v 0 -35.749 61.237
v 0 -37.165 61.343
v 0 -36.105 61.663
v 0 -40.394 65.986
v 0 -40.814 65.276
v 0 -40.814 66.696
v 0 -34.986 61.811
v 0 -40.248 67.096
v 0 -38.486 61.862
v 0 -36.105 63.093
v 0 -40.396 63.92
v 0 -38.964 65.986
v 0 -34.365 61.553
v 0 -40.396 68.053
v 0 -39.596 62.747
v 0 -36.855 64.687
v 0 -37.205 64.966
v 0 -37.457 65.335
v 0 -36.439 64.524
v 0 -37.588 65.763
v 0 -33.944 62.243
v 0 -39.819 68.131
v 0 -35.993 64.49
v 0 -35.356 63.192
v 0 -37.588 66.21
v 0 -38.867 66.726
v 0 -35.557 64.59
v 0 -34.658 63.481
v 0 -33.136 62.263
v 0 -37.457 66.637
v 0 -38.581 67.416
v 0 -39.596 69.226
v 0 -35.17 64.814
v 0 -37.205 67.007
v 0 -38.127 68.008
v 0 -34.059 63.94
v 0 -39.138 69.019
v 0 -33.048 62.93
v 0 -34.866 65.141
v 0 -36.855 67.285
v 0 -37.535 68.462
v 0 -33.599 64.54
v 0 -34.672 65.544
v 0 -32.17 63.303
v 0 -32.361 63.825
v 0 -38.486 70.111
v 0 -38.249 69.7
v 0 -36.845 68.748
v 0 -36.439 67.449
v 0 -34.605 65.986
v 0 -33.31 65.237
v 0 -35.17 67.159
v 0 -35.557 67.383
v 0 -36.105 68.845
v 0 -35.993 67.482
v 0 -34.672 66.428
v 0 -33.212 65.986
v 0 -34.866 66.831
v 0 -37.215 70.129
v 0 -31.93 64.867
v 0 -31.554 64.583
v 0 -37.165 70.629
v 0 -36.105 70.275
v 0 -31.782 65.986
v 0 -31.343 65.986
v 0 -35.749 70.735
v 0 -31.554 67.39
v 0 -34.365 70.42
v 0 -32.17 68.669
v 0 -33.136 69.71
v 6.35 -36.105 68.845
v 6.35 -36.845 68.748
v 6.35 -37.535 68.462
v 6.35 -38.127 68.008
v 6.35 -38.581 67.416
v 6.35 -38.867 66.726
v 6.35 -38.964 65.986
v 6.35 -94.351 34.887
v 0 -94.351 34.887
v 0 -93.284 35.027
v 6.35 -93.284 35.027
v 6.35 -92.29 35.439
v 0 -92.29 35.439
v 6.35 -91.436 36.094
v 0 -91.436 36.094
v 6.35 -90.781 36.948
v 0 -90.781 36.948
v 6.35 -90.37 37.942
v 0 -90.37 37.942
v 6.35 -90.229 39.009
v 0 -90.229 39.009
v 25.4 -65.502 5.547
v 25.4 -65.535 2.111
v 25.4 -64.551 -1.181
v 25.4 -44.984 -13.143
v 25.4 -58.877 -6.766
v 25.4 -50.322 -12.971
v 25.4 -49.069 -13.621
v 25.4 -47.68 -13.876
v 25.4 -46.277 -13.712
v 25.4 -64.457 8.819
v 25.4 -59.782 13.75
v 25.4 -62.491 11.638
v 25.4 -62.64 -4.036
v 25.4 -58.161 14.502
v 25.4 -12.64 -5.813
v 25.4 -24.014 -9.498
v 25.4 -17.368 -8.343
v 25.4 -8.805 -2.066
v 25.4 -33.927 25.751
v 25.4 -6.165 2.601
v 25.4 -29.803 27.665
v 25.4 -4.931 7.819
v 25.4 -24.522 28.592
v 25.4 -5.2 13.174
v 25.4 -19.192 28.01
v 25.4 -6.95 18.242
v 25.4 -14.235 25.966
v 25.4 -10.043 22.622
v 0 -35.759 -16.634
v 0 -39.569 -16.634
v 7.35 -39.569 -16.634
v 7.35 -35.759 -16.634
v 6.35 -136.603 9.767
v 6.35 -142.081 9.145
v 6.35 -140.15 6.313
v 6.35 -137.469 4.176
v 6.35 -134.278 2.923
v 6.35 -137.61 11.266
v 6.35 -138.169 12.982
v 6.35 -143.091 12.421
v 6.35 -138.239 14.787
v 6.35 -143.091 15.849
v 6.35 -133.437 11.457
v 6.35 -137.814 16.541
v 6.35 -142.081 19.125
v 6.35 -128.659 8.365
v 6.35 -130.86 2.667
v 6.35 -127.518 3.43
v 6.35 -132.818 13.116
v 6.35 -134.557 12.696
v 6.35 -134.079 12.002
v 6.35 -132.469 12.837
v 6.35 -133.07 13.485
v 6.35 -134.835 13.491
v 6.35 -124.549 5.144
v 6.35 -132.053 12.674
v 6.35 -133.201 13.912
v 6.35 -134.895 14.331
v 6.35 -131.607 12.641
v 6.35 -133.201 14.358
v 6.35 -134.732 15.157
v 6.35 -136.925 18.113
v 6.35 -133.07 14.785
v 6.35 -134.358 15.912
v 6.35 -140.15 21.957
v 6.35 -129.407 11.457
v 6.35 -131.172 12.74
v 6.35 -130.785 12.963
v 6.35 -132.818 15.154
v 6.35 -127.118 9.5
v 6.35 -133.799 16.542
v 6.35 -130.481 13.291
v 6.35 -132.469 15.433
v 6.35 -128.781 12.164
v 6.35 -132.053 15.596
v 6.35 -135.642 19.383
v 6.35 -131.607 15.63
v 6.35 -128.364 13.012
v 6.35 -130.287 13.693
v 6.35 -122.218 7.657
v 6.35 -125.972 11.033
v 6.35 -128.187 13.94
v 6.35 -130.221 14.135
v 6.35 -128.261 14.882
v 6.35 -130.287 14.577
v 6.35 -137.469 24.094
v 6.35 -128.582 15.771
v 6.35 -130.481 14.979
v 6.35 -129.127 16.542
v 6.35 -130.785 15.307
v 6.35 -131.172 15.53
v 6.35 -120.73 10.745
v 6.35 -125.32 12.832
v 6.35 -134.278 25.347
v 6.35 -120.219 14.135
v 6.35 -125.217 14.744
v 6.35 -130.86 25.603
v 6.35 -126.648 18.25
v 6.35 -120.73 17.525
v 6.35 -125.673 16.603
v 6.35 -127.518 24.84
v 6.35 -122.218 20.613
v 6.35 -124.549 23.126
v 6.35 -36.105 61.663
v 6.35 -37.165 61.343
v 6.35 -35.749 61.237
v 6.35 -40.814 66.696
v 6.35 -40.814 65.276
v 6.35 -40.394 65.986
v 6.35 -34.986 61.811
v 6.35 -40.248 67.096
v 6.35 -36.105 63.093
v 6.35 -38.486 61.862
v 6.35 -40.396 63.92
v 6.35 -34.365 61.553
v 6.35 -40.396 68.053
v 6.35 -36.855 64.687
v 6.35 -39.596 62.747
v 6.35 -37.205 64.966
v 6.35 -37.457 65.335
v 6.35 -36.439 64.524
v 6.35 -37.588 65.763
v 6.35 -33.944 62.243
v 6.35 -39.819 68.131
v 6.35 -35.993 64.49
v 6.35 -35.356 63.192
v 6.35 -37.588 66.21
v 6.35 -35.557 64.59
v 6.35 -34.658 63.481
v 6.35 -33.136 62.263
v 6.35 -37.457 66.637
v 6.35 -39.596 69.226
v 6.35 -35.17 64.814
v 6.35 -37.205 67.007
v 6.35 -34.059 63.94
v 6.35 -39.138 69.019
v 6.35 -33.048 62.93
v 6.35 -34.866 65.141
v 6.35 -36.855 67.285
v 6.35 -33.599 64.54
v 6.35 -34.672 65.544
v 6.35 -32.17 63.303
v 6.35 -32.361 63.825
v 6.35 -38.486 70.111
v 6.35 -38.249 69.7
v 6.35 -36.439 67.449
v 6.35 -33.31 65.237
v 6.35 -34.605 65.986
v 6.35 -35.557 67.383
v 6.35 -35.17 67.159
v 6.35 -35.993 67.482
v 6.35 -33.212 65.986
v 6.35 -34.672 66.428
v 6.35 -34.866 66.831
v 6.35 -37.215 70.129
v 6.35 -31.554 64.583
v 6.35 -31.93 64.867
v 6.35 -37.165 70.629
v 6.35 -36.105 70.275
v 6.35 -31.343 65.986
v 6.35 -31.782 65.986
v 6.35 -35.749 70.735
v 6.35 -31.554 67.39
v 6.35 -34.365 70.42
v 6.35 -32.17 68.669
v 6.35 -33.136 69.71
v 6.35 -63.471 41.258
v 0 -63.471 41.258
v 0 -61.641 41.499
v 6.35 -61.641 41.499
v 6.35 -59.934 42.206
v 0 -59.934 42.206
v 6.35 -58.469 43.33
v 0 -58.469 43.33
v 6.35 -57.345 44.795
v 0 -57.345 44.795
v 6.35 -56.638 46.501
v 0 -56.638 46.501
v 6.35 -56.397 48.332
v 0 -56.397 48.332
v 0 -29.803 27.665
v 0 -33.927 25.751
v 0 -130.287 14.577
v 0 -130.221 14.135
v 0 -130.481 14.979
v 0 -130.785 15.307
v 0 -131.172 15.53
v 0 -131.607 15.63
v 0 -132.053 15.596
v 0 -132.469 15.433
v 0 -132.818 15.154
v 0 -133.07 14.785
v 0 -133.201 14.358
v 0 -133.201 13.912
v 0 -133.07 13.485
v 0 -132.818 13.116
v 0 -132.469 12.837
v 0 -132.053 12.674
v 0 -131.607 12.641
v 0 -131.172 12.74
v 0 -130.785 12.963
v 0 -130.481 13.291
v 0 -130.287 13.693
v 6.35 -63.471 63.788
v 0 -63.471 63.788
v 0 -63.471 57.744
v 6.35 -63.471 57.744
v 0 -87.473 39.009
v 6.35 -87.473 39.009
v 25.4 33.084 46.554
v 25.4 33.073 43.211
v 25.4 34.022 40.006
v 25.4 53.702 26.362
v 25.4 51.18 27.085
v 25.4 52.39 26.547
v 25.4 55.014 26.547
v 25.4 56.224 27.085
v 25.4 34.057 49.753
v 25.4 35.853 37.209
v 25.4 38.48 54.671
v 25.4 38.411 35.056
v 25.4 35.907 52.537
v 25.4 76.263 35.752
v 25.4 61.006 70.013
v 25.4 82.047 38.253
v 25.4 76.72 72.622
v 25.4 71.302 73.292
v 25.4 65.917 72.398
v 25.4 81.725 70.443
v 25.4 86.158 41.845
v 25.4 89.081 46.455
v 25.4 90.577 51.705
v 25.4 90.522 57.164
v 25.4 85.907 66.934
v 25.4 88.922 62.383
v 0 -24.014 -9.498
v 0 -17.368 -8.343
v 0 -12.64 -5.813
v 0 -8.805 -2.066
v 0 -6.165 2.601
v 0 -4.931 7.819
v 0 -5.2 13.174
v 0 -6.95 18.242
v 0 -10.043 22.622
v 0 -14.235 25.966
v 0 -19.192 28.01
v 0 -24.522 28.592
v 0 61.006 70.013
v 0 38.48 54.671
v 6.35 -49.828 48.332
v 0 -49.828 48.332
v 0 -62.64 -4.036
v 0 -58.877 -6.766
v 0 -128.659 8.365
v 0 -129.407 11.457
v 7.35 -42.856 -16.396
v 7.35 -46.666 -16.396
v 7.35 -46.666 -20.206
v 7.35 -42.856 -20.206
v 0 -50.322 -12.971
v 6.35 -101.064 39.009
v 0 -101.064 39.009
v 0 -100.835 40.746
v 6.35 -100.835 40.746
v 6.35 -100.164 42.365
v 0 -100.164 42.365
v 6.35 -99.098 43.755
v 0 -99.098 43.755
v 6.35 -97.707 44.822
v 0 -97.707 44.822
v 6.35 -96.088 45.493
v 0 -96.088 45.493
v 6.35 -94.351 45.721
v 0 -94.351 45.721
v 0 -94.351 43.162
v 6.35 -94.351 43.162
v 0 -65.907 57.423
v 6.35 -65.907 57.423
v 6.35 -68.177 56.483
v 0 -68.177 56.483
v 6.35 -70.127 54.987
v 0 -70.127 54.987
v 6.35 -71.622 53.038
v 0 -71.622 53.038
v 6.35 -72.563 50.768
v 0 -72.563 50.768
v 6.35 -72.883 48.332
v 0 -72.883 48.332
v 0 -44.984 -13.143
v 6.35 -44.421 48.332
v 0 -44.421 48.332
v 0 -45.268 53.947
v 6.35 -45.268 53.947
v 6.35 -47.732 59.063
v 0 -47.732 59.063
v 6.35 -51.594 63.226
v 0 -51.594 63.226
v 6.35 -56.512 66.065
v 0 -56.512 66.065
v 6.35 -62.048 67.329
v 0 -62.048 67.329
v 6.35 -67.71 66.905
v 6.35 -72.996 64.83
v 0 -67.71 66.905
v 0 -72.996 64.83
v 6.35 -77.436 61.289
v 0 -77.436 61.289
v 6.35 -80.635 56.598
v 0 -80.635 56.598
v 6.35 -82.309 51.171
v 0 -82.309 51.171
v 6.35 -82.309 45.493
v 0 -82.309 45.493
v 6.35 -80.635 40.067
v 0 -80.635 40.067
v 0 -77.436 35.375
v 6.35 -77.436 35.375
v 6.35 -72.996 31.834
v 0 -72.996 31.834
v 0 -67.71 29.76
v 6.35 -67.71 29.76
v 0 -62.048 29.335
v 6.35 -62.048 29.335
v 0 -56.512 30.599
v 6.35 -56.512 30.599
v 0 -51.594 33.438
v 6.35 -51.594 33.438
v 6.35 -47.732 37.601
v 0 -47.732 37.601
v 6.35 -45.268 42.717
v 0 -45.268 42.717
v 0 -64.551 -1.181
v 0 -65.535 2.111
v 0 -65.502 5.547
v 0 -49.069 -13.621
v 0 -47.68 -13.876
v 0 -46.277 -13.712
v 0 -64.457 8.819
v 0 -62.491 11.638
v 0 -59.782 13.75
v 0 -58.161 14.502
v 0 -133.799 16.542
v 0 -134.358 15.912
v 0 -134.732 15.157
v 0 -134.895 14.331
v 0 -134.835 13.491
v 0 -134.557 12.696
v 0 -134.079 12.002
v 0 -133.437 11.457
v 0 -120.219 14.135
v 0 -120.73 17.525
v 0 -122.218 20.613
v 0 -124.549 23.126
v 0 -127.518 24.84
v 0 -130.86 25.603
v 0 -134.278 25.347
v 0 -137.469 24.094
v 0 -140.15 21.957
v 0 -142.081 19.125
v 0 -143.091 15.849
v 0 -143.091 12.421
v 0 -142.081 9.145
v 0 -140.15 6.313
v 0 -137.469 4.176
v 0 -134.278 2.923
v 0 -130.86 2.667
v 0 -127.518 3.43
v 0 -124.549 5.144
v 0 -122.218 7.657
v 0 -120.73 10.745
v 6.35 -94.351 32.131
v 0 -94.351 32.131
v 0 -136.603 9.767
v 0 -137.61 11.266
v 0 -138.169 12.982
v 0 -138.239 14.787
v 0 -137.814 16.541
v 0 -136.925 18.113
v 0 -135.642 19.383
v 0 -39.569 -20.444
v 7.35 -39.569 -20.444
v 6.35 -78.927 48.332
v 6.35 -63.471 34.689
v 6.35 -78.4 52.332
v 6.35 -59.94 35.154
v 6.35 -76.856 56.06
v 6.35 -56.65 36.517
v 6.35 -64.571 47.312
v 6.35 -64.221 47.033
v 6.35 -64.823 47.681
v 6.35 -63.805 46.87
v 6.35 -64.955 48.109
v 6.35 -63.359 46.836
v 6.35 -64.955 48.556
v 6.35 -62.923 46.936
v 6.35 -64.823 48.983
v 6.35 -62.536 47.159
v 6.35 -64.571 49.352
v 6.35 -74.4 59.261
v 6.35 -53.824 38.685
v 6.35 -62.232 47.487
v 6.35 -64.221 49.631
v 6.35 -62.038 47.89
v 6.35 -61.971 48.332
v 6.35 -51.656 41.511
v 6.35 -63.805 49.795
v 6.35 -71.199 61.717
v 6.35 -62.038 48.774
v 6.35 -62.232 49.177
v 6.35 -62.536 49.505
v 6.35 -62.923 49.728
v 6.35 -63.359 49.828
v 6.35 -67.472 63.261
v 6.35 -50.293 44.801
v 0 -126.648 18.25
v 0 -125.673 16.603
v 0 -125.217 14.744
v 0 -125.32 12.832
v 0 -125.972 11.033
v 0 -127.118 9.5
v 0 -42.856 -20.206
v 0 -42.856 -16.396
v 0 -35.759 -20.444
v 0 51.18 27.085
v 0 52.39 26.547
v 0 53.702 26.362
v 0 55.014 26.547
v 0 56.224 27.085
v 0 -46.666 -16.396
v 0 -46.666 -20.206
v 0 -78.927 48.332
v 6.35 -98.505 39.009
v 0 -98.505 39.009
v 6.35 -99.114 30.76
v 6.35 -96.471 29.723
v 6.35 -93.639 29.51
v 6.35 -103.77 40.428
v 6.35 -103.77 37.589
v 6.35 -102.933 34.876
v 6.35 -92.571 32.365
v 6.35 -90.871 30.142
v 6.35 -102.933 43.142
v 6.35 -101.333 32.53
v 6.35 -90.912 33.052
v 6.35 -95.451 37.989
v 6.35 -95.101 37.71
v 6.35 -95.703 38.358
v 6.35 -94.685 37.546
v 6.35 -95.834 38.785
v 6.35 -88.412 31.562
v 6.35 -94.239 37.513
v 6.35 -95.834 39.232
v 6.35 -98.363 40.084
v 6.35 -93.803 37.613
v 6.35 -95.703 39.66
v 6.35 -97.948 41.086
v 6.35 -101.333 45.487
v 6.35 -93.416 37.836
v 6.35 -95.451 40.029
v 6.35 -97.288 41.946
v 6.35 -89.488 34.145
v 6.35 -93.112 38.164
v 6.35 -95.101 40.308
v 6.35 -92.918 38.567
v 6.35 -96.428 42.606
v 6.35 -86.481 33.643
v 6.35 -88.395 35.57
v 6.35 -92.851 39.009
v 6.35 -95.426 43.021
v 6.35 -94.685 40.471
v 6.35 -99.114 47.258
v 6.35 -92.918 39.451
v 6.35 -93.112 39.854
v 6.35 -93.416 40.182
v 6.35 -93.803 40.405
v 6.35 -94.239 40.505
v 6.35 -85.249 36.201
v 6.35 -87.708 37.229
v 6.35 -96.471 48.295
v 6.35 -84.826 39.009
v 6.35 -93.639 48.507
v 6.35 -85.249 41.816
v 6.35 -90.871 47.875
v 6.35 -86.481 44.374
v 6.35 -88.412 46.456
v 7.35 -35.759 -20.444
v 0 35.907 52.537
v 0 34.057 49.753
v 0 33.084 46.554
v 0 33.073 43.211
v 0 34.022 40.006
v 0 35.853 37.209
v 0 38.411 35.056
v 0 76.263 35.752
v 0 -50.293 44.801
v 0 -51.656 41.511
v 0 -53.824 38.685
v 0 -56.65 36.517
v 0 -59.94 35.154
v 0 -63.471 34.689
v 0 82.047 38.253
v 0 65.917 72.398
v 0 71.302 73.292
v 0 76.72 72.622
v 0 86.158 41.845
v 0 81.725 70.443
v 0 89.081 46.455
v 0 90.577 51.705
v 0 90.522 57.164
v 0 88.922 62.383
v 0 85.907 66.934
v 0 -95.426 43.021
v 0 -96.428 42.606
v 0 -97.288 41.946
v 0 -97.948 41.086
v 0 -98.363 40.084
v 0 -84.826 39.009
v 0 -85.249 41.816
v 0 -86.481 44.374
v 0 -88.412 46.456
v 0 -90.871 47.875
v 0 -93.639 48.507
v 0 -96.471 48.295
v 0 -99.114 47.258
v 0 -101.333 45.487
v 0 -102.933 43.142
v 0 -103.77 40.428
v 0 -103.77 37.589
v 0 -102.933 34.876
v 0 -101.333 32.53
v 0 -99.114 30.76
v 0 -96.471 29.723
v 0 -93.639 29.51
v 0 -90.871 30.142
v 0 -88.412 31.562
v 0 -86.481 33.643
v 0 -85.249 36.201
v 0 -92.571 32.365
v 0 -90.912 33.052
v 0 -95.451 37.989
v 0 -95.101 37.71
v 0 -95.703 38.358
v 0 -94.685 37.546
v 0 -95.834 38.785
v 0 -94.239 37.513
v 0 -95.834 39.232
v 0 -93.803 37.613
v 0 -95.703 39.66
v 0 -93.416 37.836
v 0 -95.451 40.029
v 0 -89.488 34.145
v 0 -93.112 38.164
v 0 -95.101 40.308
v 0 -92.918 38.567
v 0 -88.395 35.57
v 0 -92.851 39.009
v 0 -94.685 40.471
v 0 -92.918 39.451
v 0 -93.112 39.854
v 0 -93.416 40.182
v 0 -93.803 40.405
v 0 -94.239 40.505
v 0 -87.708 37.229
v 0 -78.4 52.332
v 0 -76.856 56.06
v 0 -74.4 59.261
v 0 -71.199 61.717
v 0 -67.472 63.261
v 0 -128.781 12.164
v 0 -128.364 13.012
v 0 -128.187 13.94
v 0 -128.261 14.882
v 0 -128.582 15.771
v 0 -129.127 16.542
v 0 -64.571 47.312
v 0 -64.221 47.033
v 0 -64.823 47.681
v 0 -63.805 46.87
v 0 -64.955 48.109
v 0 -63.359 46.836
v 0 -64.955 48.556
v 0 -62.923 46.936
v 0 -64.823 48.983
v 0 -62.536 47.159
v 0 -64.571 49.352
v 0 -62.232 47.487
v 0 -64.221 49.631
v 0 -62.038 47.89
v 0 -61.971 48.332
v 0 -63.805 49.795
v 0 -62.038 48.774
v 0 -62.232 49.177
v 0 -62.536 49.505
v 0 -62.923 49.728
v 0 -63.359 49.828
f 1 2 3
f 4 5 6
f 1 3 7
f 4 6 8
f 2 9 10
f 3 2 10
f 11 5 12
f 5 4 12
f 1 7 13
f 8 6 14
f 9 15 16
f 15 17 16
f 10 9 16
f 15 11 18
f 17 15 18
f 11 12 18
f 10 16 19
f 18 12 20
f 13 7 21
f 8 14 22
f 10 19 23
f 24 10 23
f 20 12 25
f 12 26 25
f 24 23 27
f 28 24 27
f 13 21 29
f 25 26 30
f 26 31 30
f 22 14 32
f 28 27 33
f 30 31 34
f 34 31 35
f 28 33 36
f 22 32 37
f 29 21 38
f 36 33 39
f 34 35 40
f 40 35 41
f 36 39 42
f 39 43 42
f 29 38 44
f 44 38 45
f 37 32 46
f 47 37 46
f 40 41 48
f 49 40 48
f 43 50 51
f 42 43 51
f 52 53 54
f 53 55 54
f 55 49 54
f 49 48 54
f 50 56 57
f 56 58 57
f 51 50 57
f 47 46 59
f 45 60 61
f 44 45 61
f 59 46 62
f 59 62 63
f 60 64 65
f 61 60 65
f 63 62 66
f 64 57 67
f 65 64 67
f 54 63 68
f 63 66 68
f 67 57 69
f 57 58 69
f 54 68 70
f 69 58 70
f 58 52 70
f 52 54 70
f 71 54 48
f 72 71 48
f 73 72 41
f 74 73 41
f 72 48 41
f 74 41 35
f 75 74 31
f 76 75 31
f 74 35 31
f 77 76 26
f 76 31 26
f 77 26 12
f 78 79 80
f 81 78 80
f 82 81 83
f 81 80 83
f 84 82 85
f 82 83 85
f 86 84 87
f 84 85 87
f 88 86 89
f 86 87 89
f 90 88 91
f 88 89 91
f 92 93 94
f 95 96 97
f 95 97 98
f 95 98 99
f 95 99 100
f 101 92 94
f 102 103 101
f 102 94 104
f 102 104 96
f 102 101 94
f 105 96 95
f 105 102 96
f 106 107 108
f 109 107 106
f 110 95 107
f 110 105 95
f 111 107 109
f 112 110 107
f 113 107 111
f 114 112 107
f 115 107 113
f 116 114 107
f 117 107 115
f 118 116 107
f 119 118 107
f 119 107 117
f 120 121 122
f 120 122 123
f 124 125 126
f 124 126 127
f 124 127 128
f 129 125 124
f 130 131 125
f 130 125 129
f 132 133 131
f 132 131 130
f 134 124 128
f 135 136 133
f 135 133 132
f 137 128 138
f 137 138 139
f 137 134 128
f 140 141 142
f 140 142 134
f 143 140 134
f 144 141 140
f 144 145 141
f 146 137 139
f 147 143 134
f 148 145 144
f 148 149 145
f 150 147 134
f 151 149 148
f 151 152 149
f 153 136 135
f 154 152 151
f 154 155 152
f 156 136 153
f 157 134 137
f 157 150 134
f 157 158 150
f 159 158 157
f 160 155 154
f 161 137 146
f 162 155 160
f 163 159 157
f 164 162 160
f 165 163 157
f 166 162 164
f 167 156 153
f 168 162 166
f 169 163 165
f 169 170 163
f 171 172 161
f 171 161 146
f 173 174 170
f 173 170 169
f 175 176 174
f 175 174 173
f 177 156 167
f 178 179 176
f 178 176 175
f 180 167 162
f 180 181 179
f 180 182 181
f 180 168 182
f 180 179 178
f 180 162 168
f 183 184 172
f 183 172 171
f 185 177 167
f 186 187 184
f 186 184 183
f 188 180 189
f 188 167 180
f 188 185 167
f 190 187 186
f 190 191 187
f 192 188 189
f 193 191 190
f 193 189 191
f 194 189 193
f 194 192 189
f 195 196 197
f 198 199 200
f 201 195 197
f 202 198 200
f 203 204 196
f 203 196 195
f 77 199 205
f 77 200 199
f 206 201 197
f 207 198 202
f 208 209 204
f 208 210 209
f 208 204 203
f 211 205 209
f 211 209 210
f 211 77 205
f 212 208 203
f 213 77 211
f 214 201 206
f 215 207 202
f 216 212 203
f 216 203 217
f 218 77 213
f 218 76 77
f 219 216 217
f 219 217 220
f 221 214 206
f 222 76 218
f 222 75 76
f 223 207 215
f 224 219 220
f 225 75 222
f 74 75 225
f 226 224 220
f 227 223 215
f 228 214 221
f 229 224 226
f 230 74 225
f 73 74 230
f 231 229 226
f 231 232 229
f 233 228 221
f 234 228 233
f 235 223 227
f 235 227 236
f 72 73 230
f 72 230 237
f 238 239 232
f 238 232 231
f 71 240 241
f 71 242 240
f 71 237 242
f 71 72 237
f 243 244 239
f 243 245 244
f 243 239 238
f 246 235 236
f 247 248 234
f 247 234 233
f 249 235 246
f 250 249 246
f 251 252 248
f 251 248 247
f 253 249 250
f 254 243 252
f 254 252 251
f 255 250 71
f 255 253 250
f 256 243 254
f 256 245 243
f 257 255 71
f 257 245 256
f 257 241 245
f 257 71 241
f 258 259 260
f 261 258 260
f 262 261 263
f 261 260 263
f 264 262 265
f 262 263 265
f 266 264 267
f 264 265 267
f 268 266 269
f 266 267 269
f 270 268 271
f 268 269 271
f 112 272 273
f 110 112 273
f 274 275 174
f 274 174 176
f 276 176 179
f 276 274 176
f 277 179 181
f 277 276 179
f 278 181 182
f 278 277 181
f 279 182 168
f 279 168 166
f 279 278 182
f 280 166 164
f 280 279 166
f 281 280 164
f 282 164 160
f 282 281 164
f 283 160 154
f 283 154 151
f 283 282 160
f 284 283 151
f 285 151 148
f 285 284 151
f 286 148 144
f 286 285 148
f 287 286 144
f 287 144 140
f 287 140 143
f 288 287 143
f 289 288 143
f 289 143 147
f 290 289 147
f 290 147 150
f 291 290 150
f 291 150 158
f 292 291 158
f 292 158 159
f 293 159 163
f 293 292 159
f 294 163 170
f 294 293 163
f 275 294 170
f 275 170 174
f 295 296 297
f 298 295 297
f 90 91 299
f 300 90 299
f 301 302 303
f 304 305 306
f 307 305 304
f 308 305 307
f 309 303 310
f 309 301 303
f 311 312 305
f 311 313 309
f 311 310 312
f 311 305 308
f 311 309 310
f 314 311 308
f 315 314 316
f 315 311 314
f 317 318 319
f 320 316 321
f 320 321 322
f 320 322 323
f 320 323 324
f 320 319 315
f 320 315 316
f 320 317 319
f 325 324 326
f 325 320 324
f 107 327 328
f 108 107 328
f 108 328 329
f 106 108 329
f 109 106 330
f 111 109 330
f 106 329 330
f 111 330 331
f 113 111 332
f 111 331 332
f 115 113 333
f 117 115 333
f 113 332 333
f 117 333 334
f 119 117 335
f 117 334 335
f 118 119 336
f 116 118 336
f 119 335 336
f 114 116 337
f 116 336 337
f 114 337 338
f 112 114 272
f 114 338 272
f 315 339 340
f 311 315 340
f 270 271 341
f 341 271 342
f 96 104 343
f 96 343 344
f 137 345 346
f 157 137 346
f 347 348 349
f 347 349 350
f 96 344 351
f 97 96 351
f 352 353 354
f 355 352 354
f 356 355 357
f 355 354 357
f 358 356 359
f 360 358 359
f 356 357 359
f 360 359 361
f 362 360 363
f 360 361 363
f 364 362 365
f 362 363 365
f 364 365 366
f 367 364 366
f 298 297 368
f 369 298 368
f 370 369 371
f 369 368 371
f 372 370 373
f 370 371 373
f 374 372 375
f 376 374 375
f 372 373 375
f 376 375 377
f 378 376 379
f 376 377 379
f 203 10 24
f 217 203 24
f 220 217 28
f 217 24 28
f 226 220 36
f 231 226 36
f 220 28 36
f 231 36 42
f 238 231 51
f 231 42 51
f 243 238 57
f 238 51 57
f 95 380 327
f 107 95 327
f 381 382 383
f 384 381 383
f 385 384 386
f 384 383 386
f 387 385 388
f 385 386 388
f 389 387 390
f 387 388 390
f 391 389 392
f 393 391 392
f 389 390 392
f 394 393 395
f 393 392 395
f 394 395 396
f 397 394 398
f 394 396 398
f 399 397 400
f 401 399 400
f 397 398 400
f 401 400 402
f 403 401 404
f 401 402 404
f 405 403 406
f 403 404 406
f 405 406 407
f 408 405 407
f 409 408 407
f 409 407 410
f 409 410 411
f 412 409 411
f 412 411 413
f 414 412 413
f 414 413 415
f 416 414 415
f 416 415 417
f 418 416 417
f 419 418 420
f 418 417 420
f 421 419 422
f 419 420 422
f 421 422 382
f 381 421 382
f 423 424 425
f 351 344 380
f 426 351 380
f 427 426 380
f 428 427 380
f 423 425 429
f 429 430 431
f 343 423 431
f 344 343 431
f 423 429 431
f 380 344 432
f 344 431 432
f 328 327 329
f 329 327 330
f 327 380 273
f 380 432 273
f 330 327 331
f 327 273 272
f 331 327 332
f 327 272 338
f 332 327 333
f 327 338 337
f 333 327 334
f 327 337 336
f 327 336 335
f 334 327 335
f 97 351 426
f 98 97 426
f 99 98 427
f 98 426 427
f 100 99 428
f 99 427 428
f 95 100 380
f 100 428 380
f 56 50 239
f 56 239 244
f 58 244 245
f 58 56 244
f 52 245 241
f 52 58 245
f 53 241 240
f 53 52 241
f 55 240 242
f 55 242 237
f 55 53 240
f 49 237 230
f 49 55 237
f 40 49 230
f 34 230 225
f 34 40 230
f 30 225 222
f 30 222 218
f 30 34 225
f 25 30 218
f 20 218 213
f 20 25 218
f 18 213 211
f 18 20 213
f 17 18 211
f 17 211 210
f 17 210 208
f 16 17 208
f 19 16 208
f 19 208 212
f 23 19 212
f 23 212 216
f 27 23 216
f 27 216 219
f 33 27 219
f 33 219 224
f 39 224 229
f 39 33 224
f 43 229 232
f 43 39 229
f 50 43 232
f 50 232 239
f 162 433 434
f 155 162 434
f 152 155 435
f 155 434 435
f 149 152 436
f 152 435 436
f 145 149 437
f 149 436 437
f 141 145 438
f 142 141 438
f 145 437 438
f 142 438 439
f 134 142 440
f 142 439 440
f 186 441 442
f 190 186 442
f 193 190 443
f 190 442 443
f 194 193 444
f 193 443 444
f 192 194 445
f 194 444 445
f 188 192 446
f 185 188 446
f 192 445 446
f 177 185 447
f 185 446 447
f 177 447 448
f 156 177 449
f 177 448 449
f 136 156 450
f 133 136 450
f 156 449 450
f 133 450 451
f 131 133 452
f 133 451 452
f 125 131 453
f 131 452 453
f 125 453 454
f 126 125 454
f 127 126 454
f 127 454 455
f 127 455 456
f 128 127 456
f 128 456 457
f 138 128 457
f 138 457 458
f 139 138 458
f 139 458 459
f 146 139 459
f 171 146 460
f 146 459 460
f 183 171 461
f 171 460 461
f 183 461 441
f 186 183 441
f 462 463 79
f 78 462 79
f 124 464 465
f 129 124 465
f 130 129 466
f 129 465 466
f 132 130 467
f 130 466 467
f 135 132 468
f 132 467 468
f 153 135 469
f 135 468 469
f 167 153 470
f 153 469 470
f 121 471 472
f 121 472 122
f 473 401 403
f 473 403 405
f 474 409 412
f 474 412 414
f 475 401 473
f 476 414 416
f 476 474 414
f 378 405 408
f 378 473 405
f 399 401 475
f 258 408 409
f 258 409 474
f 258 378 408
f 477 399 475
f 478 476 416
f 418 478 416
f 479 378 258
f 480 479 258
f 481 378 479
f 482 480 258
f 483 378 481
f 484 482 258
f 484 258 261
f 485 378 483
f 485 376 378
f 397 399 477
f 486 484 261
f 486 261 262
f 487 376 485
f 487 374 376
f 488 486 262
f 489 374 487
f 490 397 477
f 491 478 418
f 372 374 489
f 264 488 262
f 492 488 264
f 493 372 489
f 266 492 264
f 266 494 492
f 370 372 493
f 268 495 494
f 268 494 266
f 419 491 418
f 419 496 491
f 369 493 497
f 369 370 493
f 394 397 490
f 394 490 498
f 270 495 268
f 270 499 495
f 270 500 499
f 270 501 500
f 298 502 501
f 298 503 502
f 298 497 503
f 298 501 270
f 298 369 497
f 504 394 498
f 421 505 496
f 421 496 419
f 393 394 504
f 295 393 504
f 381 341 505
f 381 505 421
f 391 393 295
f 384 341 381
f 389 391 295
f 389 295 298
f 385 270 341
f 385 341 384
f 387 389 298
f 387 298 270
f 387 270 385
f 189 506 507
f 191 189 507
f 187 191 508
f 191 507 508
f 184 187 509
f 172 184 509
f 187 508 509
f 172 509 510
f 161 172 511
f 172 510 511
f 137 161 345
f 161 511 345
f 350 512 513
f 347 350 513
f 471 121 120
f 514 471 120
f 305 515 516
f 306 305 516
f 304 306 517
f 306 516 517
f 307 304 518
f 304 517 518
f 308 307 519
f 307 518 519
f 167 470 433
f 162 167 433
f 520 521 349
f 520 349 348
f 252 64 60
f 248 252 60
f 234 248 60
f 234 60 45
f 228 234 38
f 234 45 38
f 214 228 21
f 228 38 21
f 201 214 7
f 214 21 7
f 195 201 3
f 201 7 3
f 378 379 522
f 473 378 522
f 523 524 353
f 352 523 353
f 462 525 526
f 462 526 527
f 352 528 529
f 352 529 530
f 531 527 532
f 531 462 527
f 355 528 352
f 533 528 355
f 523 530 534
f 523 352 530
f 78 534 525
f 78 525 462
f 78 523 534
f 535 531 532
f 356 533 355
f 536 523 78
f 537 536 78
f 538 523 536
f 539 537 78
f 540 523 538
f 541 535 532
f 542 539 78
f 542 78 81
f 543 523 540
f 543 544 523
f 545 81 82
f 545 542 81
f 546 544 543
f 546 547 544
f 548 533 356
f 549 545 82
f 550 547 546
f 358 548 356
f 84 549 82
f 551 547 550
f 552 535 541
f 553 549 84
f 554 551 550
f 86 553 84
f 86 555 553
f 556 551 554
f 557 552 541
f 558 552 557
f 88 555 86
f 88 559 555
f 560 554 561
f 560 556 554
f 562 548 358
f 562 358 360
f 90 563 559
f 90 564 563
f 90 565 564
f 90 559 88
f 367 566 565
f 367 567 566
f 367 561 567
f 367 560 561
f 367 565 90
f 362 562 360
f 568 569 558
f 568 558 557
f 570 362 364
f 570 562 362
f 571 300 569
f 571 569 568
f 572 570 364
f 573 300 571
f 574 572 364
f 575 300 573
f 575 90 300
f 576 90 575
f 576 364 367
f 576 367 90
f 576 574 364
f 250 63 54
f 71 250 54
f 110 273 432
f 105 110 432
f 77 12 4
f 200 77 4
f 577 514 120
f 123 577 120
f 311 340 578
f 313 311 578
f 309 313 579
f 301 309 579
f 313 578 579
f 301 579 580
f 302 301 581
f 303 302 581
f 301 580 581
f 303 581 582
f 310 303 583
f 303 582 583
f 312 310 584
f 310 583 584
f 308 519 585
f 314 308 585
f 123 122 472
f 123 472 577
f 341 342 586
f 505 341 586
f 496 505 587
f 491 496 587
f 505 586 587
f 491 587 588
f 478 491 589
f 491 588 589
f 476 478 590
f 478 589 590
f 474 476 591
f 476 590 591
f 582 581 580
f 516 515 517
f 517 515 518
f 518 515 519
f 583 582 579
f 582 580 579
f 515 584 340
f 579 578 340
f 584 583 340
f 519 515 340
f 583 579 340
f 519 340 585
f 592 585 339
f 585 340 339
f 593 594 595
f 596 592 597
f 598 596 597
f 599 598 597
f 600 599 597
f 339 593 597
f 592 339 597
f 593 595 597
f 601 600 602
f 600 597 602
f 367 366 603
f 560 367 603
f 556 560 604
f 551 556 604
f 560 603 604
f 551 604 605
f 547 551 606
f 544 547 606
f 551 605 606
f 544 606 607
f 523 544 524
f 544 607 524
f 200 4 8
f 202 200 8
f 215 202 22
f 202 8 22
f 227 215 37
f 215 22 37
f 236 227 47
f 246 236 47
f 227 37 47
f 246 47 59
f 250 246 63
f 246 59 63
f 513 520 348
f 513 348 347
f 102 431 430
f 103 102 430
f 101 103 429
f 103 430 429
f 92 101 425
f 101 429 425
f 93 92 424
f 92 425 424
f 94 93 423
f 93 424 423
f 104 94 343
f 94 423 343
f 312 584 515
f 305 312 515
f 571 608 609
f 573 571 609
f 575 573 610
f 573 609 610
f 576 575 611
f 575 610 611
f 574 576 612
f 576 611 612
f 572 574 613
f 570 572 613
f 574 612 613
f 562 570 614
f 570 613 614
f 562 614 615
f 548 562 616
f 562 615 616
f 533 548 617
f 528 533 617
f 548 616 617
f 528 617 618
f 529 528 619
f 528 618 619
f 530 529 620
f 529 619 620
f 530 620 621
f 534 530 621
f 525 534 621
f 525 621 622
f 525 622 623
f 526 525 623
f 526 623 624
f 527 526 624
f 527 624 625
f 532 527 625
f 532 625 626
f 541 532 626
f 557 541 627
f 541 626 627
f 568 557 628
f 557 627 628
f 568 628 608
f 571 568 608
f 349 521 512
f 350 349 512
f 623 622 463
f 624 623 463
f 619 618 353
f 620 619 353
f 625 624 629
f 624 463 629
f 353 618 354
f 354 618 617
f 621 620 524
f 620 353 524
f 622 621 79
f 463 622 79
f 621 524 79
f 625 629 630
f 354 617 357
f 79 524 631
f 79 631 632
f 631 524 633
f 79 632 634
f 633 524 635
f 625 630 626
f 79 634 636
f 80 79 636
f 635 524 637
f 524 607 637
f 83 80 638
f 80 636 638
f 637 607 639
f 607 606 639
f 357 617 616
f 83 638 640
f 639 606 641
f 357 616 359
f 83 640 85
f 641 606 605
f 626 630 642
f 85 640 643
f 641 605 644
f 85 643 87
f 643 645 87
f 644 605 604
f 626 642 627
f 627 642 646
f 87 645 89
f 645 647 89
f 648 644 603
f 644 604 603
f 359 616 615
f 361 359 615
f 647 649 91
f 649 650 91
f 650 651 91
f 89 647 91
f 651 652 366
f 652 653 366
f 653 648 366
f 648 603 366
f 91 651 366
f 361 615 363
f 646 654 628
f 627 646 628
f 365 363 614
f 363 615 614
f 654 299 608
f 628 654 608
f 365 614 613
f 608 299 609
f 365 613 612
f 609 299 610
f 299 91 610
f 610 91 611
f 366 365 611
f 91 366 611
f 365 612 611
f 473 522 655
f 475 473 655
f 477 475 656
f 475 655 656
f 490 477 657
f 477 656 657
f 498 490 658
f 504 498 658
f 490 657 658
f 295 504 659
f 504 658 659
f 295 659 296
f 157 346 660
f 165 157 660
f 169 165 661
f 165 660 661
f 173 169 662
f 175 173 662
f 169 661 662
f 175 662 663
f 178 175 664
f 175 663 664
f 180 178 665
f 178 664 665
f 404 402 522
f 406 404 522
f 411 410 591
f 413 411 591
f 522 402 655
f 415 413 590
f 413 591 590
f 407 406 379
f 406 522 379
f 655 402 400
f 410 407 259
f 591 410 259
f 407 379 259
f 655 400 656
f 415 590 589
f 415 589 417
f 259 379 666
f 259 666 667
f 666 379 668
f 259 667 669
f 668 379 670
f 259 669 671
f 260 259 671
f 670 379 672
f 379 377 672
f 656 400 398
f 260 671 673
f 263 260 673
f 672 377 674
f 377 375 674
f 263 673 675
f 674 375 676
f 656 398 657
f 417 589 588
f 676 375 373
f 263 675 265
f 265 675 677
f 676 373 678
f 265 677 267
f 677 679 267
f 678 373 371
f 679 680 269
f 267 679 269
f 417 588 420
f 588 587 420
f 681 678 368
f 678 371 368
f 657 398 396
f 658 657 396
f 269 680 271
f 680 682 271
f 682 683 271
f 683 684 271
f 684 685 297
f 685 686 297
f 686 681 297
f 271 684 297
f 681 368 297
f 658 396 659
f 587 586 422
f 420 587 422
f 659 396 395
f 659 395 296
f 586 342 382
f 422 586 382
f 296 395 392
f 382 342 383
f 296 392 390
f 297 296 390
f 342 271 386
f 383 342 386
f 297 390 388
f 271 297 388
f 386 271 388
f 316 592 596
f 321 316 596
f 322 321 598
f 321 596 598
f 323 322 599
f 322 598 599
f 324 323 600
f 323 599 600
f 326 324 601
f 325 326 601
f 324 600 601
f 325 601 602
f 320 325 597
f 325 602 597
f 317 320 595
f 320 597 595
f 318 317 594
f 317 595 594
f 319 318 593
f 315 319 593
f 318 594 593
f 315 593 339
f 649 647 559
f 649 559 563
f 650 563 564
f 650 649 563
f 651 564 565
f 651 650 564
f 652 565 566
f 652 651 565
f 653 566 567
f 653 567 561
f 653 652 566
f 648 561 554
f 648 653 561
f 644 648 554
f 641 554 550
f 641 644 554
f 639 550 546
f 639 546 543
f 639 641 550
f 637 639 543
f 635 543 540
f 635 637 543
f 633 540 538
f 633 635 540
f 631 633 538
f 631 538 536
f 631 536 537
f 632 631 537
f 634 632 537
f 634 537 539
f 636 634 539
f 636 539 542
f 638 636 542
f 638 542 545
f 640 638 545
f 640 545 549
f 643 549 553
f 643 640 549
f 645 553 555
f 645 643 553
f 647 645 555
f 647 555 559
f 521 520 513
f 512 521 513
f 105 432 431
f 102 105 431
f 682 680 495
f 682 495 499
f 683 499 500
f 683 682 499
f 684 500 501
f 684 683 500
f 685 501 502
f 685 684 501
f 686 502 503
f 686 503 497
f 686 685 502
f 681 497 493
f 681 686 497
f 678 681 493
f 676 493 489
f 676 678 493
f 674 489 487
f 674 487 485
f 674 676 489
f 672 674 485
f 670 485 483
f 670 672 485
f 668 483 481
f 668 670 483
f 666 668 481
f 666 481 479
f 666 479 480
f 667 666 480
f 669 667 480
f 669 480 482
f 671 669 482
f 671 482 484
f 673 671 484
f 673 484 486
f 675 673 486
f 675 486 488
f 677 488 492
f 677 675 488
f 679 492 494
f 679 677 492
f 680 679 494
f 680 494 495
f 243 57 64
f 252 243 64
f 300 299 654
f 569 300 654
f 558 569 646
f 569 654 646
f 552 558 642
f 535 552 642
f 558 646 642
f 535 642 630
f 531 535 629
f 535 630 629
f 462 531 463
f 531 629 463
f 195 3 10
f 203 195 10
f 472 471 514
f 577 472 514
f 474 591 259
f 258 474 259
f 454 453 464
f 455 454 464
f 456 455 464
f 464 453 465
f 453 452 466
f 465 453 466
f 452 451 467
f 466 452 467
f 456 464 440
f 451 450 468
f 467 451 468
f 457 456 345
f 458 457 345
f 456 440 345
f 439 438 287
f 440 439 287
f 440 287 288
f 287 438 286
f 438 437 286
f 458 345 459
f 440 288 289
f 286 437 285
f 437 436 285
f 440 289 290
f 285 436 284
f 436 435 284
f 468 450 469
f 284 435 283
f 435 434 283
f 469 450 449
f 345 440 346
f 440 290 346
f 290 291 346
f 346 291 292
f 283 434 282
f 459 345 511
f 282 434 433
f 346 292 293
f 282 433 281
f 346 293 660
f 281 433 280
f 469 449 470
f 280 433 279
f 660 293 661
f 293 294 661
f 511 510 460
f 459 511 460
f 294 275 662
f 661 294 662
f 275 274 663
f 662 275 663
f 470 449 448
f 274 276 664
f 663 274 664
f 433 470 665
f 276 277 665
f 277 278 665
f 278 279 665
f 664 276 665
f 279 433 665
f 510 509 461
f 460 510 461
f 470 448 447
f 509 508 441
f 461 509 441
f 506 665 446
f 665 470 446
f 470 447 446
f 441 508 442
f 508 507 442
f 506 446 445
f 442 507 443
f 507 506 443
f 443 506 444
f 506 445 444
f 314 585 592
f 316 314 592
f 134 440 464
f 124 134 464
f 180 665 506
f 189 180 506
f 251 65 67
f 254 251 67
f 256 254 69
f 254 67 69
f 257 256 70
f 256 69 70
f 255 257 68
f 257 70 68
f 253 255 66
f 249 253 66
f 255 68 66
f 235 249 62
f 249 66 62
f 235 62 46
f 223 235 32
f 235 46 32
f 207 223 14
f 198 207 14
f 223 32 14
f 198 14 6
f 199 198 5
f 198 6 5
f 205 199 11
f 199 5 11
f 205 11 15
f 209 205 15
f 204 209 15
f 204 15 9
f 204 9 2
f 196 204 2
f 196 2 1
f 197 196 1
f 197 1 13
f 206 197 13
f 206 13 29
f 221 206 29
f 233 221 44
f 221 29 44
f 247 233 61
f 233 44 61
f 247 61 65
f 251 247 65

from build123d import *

# Parameters (mm, degrees)
F1_W     = 3.81
F1_H     = 3.81
F2_DEPTH = 7.35000054
F0_R     = 19.05
F0_R_2   = 1.499997
F3_DEPTH = 6.35
F0_R_3   = 4.7625
F0_R_4   = 9.525
F0_R_5   = 11.5
F0_R_6   = 1.4986
F4_DEPTH = 25.4
F5_DEPTH = 25.4


with BuildPart() as f2:
    # F1 (on Right) → F2 (new body)
    with BuildSketch(Plane.YZ):
        with Locations((-44.7605111825, -18.301277816)):
            Rectangle(F1_W, F1_H)
    extrude(amount=F2_DEPTH)


with BuildPart() as f2b:
    # F1 (on Right) → F2, piece 2 (new body)
    with BuildSketch(Plane.YZ):
        with Locations((-37.6643843636, -18.539402816)):
            Rectangle(F1_W, F1_H)
    extrude(amount=F2_DEPTH)


with BuildPart() as f3:
    # F0 (on Right) → F3 (new body)
    with BuildSketch(Plane.YZ):
        with Locations((-63.4714198452, 48.3321648699)):
            Circle(F0_R)
        with BuildLine():
            Line((-63.4714198452, 34.6891544759), (-63.4714198452, 41.2581190467))
            ThreePointArc((-63.4714198452, 41.2581190467), (-58.4693140731, 43.3300590979), (-56.3973740219, 48.3321648699))
            Line((-56.3973740219, 48.3321648699), (-49.8284094511, 48.3321648699))
            ThreePointArc((-49.8284094511, 48.3321648699), (-53.8243546798, 38.6850997045), (-63.4714198452, 34.6891544759))
        make_face(mode=Mode.SUBTRACT)
        with Locations((-63.4714198452, 48.3321648699)):
            Circle(F0_R_2, mode=Mode.SUBTRACT)
        with BuildLine():
            ThreePointArc((-63.4714198452, 57.7441796185), (-70.1267192985, 54.9874643232), (-72.8834345937, 48.3321648699))
            Line((-72.8834345937, 48.3321648699), (-78.9268836379, 48.3321648699))
            ThreePointArc((-78.9268836379, 48.3321648699), (-74.4000830994, 59.2608281242), (-63.4714198452, 63.7876286627))
            Line((-63.4714198452, 63.7876286627), (-63.4714198452, 57.7441796185))
        make_face(mode=Mode.SUBTRACT)
    extrude(amount=F3_DEPTH)


with BuildPart() as f3b:
    # F0 (on Right) → F3, piece 2 (new body)
    with BuildSketch(Plane.YZ):
        with Locations((-36.1051460727, 65.9862762386)):
            Circle(F0_R_3)
        with BuildLine():
            Line((-36.1051460727, 61.6634078324), (-36.1051460727, 63.0929395556))
            ThreePointArc((-36.1051460727, 63.0929395556), (-34.0592480839, 63.9403782498), (-33.2118093897, 65.9862762386))
            Line((-33.2118093897, 65.9862762386), (-31.7822776665, 65.9862762386))
            ThreePointArc((-31.7822776665, 65.9862762386), (-33.0484165085, 62.9295466744), (-36.1051460727, 61.6634078324))
        make_face(mode=Mode.SUBTRACT)
        with Locations((-36.1051460727, 65.9862762386)):
            Circle(F0_R_2, mode=Mode.SUBTRACT)
        with BuildLine():
            ThreePointArc((-36.1051460727, 68.8452638756), (-38.1267556181, 68.0078857841), (-38.9641337097, 65.9862762386))
            Line((-38.9641337097, 65.9862762386), (-40.3936691582, 65.9862762386))
            ThreePointArc((-40.3936691582, 65.9862762386), (-39.1375898277, 69.0187199937), (-36.1051460727, 70.2747993241))
            Line((-36.1051460727, 70.2747993241), (-36.1051460727, 68.8452638756))
        make_face(mode=Mode.SUBTRACT)
    extrude(amount=F3_DEPTH)


with BuildPart() as f3c:
    # F0 (on Right) → F3, piece 3 (new body)
    with BuildSketch(Plane.YZ):
        with Locations((-94.3511191739, 39.0088330027)):
            Circle(F0_R_4)
        with BuildLine():
            ThreePointArc((-87.4733247774, 39.0088330027), (-89.4877841165, 34.1454979453), (-94.3511191739, 32.1310386062))
            Line((-94.3511191739, 32.1310386062), (-94.3511191739, 34.8868891597))
            ThreePointArc((-94.3511191739, 34.8868891597), (-91.4364647309, 36.0941785596), (-90.2291753309, 39.0088330027))
            Line((-90.2291753309, 39.0088330027), (-87.4733247774, 39.0088330027))
        make_face(mode=Mode.SUBTRACT)
        with Locations((-94.3511191739, 39.0088330027)):
            Circle(F0_R_2, mode=Mode.SUBTRACT)
        with BuildLine():
            Line((-98.5046252608, 39.0088330027), (-101.063631475, 39.0088330027))
            ThreePointArc((-101.063631475, 39.0088330027), (-99.0975821408, 43.7552959696), (-94.3511191739, 45.7213453037))
            Line((-94.3511191739, 45.7213453037), (-94.3511191739, 43.1623390896))
            ThreePointArc((-94.3511191739, 43.1623390896), (-97.2880914937, 41.9458053224), (-98.5046252608, 39.0088330027))
        make_face(mode=Mode.SUBTRACT)
    extrude(amount=F3_DEPTH)


with BuildPart() as f3d:
    # F0 (on Right) → F3, piece 4 (new body)
    with BuildSketch(Plane.YZ):
        with Locations((-131.7194551229, 14.1350999475)):
            Circle(F0_R_5)
        with BuildLine():
            ThreePointArc((-126.6475162499, 18.2496783274), (-125.3196537335, 12.8324636385), (-128.6594122648, 8.3653116599))
            Line((-128.6594122648, 8.3653116599), (-129.4073515506, 11.4570217448))
            ThreePointArc((-129.4073515506, 11.4570217448), (-128.1867632167, 13.9401289647), (-129.1266828775, 16.5424756706))
            Line((-129.1266828775, 16.5424756706), (-126.6475162499, 18.2496783274))
        make_face(mode=Mode.SUBTRACT)
        with BuildLine():
            Line((-133.4368059918, 11.4570217448), (-136.6029530764, 9.7671113908))
            ThreePointArc((-136.6029530764, 9.7671113908), (-138.2389152344, 14.7866489839), (-135.6419347373, 19.3831500584))
            Line((-135.6419347373, 19.3831500584), (-133.7993443012, 16.5424756706))
            ThreePointArc((-133.7993443012, 16.5424756706), (-134.8928158654, 13.9088733695), (-133.4368059918, 11.4570217448))
        make_face(mode=Mode.SUBTRACT)
        with Locations((-131.7194551229, 14.1350999475)):
            Circle(F0_R_6, mode=Mode.SUBTRACT)
    extrude(amount=F3_DEPTH)


with BuildPart() as f4:
    # F0 (on Right) → F4 (new body)
    with BuildSketch(Plane.YZ):
        with BuildLine():
            Line((-44.9844066674, -13.1433418189), (-24.0138664913, -9.4980324265))
            Line((-24.0138664913, -9.4980324265), (-17.3682536164, -8.3428254158))
            ThreePointArc((-17.3682536164, -8.3428254158), (-5.8956209633, 15.770212574), (-29.8034821706, 27.6645000087))
            Line((-29.8034821706, 27.6645000087), (-33.9266775087, 25.7506994656))
            Line((-33.9266775087, 25.7506994656), (-58.1610789035, 14.502187875))
            Line((-58.1610789035, 14.502187875), (-59.7815049134, 13.7500595076))
            ThreePointArc((-59.7815049134, 13.7500595076), (-65.502067365, 5.546642504), (-62.6399811027, -4.0361205383))
            Line((-62.6399811027, -4.0361205383), (-58.8765542048, -6.7659430233))
            Line((-58.8765542048, -6.7659430233), (-50.3222974662, -12.9708203918))
            ThreePointArc((-50.3222974662, -12.9708203918), (-47.679810488, -13.8757165934), (-44.9844066674, -13.1433418189))
        make_face()
    extrude(amount=F4_DEPTH)


with BuildPart() as f5:
    # F0 (on Right) → F5 (new body)
    with BuildSketch(Plane.YZ):
        with BuildLine():
            Line((38.4110773648, 35.0562312206), (51.1799276346, 27.0850012639))
            ThreePointArc((51.1799276346, 27.0850012639), (53.7019310165, 26.3624152719), (56.2239343983, 27.0850012639))
            Line((56.2239343983, 27.0850012639), (76.2634365035, 35.7517570543))
            Line((76.2634365035, 35.7517570543), (82.0465136748, 38.2528430243))
            ThreePointArc((82.0465136748, 38.2528430243), (87.5784037852, 64.7673025363), (61.0059292553, 70.0134409982))
            Line((61.0059292553, 70.0134409982), (38.4803215482, 54.6712705412))
            ThreePointArc((38.4803215482, 54.6712705412), (32.9565094667, 44.8831285876), (38.4110773648, 35.0562312206))
        make_face()
    extrude(amount=F5_DEPTH)


solid = Compound([f2.part, f2b.part, f3.part, f3b.part, f3c.part, f3d.part, f4.part, f5.part])
